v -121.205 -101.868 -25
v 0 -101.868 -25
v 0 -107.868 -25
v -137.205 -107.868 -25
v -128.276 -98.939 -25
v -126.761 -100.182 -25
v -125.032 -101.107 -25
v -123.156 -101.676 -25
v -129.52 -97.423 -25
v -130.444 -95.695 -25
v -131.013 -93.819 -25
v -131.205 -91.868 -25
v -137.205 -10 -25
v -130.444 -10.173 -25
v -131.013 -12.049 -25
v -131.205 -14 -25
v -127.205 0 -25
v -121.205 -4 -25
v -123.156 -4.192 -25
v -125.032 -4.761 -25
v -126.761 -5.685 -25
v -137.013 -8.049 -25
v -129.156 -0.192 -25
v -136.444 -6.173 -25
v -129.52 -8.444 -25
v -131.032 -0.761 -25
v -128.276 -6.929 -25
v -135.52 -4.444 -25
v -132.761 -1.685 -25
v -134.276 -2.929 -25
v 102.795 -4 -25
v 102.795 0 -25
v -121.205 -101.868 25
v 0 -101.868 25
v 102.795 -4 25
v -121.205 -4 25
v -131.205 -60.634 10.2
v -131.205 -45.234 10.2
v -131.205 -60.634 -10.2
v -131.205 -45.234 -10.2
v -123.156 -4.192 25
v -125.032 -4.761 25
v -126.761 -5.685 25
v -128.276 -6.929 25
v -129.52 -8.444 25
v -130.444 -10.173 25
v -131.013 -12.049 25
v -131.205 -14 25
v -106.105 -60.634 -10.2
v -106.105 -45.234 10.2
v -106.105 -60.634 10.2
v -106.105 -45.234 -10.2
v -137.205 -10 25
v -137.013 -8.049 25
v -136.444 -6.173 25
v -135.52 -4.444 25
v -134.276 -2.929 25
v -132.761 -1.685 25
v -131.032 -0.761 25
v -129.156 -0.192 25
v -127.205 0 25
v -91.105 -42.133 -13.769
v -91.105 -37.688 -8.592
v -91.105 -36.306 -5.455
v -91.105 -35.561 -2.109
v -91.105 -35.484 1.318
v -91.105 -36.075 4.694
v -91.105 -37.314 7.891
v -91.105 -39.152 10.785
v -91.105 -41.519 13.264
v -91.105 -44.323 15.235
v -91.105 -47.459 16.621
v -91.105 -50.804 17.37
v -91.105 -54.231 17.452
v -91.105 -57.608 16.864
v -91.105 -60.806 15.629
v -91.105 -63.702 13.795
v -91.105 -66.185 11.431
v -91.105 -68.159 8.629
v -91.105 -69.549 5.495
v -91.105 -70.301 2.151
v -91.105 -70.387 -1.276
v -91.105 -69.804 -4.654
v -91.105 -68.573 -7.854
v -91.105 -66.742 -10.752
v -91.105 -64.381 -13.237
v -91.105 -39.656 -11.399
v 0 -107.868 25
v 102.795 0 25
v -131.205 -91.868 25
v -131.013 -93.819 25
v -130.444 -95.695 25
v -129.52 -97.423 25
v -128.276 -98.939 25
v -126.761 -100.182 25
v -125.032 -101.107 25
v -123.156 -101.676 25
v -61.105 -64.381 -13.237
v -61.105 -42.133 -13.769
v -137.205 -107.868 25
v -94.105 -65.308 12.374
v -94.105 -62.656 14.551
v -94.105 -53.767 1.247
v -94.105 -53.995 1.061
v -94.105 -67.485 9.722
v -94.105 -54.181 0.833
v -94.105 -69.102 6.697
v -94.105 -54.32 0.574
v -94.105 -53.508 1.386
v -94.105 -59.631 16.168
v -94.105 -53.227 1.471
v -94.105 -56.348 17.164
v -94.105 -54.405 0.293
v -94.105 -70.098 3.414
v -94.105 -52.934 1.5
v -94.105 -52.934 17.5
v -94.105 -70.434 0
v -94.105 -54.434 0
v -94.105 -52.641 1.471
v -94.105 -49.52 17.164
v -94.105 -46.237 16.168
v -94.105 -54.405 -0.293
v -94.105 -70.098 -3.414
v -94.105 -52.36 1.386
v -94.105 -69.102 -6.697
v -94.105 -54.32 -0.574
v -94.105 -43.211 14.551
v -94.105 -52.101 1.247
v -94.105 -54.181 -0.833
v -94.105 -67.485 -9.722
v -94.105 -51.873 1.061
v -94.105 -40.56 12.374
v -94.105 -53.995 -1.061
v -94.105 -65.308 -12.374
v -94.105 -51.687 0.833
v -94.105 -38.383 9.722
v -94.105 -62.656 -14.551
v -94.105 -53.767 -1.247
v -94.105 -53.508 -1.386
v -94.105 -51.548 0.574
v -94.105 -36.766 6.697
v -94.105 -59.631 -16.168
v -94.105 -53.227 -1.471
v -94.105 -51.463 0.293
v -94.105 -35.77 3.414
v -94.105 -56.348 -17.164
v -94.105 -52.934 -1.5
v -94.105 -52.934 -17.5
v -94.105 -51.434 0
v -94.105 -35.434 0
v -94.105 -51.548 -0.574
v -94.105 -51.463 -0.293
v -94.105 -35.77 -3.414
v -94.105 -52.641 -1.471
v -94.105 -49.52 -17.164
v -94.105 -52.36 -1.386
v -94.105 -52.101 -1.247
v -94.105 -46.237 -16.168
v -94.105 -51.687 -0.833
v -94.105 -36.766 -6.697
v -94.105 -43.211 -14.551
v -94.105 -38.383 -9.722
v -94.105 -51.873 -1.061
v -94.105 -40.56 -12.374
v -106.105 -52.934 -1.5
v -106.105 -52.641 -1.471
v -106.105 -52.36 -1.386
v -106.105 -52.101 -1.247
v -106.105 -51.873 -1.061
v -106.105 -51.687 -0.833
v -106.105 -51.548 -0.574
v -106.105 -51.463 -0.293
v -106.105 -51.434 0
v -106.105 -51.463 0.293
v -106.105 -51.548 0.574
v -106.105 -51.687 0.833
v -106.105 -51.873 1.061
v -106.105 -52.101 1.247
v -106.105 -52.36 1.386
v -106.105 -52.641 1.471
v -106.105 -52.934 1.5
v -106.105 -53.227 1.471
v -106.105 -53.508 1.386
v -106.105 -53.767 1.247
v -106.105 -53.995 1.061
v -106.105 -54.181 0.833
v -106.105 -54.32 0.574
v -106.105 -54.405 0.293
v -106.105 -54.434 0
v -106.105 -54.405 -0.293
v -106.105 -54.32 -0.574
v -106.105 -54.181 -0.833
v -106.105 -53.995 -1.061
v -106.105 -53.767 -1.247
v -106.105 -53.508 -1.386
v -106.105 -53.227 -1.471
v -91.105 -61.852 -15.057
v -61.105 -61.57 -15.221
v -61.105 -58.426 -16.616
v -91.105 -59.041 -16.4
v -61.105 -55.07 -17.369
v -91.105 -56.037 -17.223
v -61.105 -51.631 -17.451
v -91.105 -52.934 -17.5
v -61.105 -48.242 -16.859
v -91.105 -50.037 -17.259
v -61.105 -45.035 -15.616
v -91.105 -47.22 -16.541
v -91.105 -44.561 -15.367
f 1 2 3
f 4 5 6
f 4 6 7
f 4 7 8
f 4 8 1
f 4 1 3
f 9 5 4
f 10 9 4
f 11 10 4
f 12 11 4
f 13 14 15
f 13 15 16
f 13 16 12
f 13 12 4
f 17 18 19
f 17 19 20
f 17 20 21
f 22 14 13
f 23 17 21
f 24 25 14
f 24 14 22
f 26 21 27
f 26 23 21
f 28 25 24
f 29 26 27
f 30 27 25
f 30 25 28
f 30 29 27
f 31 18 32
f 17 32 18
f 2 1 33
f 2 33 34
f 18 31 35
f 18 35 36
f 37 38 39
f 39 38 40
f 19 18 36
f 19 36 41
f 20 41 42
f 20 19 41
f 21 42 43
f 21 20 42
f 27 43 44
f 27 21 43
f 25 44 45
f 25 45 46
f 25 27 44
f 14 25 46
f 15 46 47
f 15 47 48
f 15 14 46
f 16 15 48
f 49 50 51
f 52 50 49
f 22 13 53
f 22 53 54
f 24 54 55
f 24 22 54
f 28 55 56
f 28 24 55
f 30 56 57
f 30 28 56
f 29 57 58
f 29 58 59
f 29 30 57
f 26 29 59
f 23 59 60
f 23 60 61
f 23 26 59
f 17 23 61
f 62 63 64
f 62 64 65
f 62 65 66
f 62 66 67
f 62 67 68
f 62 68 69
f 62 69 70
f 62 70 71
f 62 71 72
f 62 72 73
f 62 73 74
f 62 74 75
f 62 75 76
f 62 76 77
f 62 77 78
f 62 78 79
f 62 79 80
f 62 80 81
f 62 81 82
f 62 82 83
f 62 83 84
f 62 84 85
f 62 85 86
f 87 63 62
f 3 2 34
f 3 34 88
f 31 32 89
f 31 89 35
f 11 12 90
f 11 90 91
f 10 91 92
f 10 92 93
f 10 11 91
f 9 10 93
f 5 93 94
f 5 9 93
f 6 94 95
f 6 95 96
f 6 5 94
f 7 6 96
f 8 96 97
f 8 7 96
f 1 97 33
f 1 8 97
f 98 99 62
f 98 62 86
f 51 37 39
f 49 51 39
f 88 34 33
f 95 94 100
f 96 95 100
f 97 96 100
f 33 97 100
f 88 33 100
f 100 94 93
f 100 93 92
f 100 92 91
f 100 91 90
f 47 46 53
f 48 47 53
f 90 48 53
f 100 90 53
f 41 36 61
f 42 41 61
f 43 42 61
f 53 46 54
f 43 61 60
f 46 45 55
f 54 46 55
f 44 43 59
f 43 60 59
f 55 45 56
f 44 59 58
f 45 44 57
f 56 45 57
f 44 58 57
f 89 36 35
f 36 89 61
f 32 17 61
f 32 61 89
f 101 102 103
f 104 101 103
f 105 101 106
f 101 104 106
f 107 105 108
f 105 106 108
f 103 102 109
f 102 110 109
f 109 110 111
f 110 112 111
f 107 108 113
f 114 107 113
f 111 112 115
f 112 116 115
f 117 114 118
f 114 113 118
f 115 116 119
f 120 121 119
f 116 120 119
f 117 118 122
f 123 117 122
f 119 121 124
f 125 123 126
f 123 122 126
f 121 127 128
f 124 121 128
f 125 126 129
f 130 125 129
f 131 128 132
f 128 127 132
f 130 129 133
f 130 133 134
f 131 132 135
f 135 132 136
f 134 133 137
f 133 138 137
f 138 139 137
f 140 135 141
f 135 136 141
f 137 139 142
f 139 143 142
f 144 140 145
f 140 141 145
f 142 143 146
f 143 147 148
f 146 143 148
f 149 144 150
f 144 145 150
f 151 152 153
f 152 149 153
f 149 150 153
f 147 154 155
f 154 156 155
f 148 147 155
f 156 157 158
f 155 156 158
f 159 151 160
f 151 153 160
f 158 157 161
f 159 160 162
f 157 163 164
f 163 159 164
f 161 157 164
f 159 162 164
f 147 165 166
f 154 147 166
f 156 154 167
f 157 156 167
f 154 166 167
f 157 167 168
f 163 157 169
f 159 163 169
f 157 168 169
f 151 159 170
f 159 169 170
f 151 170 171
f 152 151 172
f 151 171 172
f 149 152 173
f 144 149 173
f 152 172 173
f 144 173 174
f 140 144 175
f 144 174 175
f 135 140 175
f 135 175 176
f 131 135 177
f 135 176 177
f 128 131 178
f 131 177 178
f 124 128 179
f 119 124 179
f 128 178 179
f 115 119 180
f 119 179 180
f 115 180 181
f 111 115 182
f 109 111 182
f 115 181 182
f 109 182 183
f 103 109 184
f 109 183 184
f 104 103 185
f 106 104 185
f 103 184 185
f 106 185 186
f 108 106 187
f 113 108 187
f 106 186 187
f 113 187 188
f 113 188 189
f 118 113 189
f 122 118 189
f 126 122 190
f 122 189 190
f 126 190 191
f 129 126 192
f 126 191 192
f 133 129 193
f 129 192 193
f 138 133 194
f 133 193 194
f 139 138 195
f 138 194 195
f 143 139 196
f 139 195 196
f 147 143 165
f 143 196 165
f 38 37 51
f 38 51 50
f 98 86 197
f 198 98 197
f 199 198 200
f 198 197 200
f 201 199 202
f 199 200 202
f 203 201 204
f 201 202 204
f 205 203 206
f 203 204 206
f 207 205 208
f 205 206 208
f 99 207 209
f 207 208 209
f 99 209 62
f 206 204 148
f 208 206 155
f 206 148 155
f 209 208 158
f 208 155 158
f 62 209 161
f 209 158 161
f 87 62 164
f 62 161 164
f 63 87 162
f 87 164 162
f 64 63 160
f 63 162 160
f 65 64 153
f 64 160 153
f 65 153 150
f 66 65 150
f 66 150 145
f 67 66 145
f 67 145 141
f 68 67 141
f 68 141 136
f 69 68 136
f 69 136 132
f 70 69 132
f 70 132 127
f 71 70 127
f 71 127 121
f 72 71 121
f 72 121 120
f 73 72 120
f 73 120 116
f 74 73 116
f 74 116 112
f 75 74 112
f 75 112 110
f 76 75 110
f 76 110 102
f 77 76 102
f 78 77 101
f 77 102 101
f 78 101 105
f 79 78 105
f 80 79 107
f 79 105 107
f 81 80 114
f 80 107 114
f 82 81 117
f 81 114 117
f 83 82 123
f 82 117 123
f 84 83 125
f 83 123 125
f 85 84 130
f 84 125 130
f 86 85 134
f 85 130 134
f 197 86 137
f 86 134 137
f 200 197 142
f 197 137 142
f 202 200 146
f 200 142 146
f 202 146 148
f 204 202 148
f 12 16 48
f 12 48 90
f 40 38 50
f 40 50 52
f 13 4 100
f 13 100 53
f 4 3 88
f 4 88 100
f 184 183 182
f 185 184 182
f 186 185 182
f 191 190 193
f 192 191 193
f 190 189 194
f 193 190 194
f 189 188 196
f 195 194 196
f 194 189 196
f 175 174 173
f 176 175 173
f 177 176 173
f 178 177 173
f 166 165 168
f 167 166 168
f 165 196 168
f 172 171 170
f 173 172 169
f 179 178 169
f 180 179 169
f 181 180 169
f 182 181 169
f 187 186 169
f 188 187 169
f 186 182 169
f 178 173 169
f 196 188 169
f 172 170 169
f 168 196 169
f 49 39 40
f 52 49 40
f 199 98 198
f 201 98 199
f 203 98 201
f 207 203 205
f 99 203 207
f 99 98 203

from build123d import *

# Parameters (mm, degrees)
BOSS_EXTRUDE1_DEPTH      = 25
BOSS_EXTRUDE1_DEPTH_BACK = 25
SKETCH2_W                = 20.4
SKETCH2_H                = 15.4
BOSS_EXTRUDE2_DEPTH      = 25.1
SKETCH3_R                = 1.5
BOSS_EXTRUDE3_DEPTH      = 12
SKETCH4_R                = 17.5
BOSS_EXTRUDE4_DEPTH      = 3
BOSS_EXTRUDE5_DEPTH      = 30


with BuildPart() as part:
    # Sketch1 → Boss-Extrude1 (new, two sides: drawn at the far end of the back side and taken through both)
    with BuildSketch(Plane.XY.offset(-BOSS_EXTRUDE1_DEPTH_BACK)):
        with BuildLine():
            Line((-102.79479724, 0), (102.79479724, 0))
            Line((102.79479724, 0), (102.79479724, -4))
            Line((102.79479724, -4), (-121.20520276, -4))
            ThreePointArc((-121.20520276, -4), (-128.276270572, -6.928932188), (-131.20520276, -14))
            Line((-131.20520276, -14), (-131.20520276, -91.867761665))
            ThreePointArc((-131.20520276, -91.867761665), (-128.276270572, -98.938829477), (-121.20520276, -101.867761665))
            Line((-121.20520276, -101.867761665), (0, -101.867761665))
            Line((0, -101.867761665), (0, -107.867761665))
            Line((0, -107.867761665), (-137.20520276, -107.867761665))
            Line((-137.20520276, -107.867761665), (-137.20520276, -10))
            ThreePointArc((-137.20520276, -10), (-134.276270572, -2.928932188), (-127.20520276, 0))
            Line((-127.20520276, 0), (-102.79479724, 0))
        make_face()
    extrude(amount=BOSS_EXTRUDE1_DEPTH + BOSS_EXTRUDE1_DEPTH_BACK)


with BuildPart() as body_2:
    # Sketch2 → Boss-Extrude2 (new body)
    with BuildSketch(Plane(origin=(-131.20520276, 0, 0), x_dir=(0, 0, -1), z_dir=(1, 0, 0))):
        with Locations((0, -52.933880832)):
            Rectangle(SKETCH2_W, SKETCH2_H)
    extrude(amount=BOSS_EXTRUDE2_DEPTH)


with BuildPart() as body_3:
    # Sketch3 → Boss-Extrude3 (new body)
    with BuildSketch(Plane(origin=(-106.10520276, 0, 0), x_dir=(0, 0, -1), z_dir=(1, 0, 0))):
        with Locations((0, -52.933880832)):
            Circle(SKETCH3_R)
    extrude(amount=BOSS_EXTRUDE3_DEPTH)

    # Sketch4 → Boss-Extrude4 (add)
    with BuildSketch(Plane(origin=(-94.10520276, 0, 0), x_dir=(0, 0, -1), z_dir=(1, 0, 0))):
        with Locations((0, -52.933880832)):
            Circle(SKETCH4_R)
    extrude(amount=BOSS_EXTRUDE4_DEPTH)

    # Sketch5 → Boss-Extrude5 (add)
    with BuildSketch(Plane(origin=(-91.10520276, 0, 0), x_dir=(0, 0, -1), z_dir=(1, 0, 0))):
        with BuildLine():
            Line((13.76915299, -42.132935229), (13.237108587, -64.380668865))
            ThreePointArc((13.237108587, -64.380668865), (17.494997973, -53.35226573), (13.76915299, -42.132935229))
        make_face()
    extrude(amount=BOSS_EXTRUDE5_DEPTH)


solid = Compound([part.part, body_2.part, body_3.part])
